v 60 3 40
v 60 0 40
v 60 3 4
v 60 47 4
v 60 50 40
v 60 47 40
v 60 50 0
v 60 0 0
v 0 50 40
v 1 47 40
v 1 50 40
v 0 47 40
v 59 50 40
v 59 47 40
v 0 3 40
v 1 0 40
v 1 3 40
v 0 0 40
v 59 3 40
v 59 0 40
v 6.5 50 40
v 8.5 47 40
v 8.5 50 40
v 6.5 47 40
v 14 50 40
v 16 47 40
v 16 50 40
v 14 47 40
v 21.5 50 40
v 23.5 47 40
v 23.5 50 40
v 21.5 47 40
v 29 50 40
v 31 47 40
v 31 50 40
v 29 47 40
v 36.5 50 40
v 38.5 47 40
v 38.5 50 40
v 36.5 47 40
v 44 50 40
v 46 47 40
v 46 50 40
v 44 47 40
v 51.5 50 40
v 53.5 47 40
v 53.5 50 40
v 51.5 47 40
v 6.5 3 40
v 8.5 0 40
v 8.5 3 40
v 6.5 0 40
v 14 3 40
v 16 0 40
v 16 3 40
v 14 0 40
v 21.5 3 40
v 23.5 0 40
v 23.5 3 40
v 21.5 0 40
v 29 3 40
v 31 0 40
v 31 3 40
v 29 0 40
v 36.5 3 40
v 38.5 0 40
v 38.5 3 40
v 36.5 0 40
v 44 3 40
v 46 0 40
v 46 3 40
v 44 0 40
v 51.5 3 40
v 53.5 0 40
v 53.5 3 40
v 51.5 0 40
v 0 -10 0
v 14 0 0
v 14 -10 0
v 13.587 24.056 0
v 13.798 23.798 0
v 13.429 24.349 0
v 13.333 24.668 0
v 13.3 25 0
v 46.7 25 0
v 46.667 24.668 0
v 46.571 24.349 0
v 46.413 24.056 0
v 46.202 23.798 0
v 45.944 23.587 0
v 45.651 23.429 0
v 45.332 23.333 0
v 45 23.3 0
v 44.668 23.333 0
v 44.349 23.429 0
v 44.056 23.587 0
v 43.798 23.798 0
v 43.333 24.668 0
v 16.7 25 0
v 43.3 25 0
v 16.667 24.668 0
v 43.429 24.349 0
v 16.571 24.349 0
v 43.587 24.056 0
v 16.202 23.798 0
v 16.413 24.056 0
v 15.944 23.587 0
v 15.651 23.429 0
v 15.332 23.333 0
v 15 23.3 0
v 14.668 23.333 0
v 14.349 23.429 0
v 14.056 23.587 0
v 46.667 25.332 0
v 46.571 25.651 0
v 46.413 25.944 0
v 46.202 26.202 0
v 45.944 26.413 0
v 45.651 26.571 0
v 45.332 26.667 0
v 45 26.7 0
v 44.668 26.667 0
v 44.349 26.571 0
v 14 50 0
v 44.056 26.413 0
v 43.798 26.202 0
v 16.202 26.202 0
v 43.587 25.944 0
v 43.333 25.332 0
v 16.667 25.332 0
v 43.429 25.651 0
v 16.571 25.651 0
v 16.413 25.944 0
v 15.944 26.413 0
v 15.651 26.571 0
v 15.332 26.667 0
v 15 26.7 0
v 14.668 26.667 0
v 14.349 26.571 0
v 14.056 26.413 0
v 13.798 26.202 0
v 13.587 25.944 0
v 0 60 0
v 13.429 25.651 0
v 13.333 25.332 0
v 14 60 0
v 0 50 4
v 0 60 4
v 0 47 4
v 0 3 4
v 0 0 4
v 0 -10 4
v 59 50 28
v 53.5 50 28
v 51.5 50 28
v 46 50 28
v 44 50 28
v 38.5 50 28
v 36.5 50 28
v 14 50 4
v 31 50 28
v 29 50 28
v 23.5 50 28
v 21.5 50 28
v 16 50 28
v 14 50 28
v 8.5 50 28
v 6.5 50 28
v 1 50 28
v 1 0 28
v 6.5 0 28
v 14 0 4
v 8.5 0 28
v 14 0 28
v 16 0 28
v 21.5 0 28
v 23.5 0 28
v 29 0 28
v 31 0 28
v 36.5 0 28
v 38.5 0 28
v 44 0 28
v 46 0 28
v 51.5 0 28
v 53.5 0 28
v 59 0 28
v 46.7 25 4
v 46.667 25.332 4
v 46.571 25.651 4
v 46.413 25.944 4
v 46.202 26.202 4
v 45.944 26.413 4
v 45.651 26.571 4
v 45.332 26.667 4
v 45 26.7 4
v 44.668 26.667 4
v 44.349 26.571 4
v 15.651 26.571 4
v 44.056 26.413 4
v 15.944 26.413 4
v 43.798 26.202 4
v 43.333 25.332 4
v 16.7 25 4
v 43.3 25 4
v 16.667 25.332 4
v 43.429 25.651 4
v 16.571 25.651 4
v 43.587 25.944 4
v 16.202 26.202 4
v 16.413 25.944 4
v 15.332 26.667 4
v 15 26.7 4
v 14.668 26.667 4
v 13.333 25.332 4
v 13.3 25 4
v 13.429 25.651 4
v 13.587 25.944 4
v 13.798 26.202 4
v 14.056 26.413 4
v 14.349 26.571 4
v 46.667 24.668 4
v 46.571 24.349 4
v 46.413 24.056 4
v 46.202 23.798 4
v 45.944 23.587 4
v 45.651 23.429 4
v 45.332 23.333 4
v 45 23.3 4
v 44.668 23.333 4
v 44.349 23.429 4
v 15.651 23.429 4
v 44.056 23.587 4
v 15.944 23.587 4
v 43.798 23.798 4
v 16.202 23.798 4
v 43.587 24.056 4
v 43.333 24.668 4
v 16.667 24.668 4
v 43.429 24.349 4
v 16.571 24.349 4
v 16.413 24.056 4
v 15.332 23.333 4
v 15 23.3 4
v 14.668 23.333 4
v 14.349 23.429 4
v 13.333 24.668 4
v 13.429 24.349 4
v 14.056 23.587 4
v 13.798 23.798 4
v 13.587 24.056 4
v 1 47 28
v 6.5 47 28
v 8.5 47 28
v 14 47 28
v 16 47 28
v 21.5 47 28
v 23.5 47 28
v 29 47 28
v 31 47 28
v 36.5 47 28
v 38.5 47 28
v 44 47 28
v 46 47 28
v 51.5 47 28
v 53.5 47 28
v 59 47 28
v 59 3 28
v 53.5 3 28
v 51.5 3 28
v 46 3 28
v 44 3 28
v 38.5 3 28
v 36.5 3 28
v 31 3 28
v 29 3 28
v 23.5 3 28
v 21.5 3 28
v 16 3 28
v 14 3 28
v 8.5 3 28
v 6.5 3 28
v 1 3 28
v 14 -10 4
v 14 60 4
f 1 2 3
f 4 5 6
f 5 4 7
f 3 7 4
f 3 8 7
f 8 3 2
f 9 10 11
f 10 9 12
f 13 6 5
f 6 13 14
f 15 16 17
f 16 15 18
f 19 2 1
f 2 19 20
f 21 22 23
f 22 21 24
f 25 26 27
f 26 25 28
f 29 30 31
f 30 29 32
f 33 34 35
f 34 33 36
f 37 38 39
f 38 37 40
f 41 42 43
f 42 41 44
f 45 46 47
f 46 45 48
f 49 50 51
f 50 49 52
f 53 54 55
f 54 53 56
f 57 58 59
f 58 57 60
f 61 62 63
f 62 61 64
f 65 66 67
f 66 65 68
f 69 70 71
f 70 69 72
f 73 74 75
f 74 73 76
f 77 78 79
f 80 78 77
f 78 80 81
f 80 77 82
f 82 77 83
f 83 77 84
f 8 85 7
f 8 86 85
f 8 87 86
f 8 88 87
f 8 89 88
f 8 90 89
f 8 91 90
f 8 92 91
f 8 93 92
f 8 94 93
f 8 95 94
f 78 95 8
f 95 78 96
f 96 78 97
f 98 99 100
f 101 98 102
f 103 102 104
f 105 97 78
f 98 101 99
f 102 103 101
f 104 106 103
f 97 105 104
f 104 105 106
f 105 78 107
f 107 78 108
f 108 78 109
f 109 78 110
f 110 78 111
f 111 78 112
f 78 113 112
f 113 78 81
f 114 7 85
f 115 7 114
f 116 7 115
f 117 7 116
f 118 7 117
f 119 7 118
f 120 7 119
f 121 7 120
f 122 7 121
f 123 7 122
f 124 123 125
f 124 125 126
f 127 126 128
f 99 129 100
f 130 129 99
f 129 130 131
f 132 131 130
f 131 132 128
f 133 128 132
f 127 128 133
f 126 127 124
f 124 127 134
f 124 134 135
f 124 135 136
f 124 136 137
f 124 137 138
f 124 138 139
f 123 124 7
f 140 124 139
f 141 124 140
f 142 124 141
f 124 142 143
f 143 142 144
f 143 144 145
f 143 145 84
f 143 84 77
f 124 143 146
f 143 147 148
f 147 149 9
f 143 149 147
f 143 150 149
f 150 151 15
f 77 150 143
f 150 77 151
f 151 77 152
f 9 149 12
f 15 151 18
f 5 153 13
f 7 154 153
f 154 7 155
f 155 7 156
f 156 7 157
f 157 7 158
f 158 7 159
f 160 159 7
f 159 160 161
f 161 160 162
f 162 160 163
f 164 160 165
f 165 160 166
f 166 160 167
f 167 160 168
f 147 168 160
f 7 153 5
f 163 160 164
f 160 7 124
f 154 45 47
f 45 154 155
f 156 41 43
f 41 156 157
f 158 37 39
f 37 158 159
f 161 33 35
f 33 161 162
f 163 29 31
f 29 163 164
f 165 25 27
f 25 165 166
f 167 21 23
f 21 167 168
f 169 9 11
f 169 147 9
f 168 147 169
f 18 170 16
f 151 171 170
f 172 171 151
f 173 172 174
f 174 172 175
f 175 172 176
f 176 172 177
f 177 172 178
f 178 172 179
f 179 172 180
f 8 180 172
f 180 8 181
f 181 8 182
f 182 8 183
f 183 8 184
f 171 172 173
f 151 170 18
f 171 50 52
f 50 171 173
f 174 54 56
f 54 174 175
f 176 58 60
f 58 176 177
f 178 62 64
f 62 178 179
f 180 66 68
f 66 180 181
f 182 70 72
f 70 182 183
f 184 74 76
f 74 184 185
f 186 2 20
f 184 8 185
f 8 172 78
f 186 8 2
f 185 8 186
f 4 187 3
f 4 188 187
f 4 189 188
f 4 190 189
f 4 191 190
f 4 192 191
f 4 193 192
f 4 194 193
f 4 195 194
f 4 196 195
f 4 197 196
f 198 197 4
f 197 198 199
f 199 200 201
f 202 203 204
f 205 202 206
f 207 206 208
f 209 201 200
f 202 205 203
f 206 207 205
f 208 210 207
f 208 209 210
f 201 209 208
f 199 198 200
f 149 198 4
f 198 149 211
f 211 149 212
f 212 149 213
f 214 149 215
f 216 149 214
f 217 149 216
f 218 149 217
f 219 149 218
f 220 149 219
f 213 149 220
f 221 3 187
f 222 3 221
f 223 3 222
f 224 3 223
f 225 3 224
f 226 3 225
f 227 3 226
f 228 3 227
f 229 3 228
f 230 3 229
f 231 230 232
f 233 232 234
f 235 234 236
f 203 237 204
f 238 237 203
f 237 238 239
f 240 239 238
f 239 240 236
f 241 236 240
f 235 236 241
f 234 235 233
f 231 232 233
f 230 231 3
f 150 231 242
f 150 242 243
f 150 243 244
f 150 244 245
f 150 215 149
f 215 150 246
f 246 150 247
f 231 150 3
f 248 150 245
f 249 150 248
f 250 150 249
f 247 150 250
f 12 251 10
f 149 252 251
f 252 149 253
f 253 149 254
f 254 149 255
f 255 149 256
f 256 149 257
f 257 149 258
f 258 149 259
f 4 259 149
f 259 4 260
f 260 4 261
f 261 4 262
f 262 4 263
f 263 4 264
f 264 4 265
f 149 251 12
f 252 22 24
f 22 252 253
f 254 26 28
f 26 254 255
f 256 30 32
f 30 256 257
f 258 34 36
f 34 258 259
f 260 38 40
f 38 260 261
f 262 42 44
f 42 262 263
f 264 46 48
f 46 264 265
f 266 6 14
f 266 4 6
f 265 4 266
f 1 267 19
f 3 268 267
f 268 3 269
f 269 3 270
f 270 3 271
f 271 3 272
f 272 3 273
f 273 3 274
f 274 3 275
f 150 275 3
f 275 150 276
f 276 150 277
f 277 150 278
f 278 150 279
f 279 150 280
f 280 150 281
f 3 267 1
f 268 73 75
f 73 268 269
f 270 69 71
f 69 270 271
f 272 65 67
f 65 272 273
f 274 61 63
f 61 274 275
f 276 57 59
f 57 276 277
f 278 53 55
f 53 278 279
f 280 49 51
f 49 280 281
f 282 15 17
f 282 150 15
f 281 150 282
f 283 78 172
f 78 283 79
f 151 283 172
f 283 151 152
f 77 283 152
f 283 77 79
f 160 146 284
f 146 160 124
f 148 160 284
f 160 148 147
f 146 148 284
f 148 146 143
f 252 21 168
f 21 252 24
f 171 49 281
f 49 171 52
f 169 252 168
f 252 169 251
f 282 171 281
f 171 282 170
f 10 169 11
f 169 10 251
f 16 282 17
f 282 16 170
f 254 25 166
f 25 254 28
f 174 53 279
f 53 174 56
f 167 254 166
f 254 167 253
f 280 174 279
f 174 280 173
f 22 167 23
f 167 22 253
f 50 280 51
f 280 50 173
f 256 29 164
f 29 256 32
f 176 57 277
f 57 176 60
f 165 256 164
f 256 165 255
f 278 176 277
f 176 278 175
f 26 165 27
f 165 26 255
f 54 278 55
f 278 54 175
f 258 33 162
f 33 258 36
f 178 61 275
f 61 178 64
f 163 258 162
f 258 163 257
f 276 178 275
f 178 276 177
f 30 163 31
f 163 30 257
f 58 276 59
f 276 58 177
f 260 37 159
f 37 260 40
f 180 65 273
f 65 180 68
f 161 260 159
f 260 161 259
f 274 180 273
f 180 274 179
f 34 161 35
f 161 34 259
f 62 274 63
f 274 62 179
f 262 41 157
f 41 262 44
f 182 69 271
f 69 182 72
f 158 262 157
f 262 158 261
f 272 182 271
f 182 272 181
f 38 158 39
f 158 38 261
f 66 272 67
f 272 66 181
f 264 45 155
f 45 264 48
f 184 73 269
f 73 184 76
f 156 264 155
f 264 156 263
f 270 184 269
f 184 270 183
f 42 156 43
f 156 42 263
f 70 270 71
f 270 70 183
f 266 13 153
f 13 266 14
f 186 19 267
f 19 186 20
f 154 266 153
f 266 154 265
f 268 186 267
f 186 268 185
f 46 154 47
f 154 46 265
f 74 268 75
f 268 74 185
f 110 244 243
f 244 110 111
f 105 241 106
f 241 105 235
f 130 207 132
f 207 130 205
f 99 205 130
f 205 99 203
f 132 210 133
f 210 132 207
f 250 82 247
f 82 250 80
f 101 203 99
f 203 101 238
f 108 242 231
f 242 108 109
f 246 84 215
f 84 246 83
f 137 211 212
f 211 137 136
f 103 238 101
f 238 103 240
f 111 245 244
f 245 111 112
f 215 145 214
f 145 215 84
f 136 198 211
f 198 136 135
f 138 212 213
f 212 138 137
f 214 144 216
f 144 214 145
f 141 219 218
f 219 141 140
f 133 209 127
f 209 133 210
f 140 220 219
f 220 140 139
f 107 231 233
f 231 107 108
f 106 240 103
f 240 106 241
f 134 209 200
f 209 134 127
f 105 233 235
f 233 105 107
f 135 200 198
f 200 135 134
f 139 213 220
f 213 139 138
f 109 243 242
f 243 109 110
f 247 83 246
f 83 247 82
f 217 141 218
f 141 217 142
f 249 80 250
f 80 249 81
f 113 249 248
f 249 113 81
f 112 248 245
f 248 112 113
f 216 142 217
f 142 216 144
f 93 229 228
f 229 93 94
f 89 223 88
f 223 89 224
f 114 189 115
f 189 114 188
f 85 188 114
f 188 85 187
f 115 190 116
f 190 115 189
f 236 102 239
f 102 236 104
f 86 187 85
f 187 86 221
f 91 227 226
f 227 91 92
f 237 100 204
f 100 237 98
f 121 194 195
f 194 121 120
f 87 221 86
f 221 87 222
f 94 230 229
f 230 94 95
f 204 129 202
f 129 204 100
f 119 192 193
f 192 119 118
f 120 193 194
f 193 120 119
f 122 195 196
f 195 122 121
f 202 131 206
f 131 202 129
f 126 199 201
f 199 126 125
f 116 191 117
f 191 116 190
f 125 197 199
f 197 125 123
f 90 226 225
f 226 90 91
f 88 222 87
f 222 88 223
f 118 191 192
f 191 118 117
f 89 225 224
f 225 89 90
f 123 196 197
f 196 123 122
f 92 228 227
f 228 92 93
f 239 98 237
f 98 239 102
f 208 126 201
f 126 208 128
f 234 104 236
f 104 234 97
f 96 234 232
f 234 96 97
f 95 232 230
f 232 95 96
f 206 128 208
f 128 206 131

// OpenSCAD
$fn = 32;

// ----------------------------------------------------------------------
// Cable duct: 60 x 50 x 40 mm, 8 fingers
// ----------------------------------------------------------------------

// --- parameters (mm) ---
channel_l = 60;           // duct length, X
channel_w = 50;           // duct width, Y
channel_h = 40;           // duct height, Z
channel_t = 3;            // side wall thickness
floor_t = 4;              // floor thickness
slot_w = 5.5;             // finger slot width
slot_h = 24;              // finger slot height
fingers = 8;              // number of finger slots per side
pitch = 7.5;              // finger pitch
hole_d = 3.4;             // floor mounting hole
hole_n = 2;               // mounting holes in the floor
ear_w = 11;               // mounting ear width
ear_l = 14;               // mounting ear length

module shell() {
  difference() {
    cube([channel_l, channel_w, channel_h]);
    /* open top channel */
    translate([-channel_t - 1, channel_t, floor_t])
      cube([channel_l + 2 * channel_t + 2, channel_w - 2 * channel_t, channel_h + 1]);
  }
}

module ears() {
  translate([0, -ear_w + 1, 0]) cube([ear_l, ear_w, floor_t]);
  translate([0, channel_w - 1, 0]) cube([ear_l, ear_w, floor_t]);
}

difference() {
  union() {
    shell();
    ears();
  }
  /* finger slots cut through both side walls */
  for (i = [0 : fingers - 1]) translate([pitch / 2 + i * pitch - slot_w / 2, -1, floor_t + slot_h]) cube([slot_w, channel_w + 2, channel_h]);
  for (i = [0 : hole_n - 1]) translate([(channel_l / hole_n) * (i + 0.5), channel_w / 2, -1]) cylinder(h = floor_t + 2, d = hole_d);
}
